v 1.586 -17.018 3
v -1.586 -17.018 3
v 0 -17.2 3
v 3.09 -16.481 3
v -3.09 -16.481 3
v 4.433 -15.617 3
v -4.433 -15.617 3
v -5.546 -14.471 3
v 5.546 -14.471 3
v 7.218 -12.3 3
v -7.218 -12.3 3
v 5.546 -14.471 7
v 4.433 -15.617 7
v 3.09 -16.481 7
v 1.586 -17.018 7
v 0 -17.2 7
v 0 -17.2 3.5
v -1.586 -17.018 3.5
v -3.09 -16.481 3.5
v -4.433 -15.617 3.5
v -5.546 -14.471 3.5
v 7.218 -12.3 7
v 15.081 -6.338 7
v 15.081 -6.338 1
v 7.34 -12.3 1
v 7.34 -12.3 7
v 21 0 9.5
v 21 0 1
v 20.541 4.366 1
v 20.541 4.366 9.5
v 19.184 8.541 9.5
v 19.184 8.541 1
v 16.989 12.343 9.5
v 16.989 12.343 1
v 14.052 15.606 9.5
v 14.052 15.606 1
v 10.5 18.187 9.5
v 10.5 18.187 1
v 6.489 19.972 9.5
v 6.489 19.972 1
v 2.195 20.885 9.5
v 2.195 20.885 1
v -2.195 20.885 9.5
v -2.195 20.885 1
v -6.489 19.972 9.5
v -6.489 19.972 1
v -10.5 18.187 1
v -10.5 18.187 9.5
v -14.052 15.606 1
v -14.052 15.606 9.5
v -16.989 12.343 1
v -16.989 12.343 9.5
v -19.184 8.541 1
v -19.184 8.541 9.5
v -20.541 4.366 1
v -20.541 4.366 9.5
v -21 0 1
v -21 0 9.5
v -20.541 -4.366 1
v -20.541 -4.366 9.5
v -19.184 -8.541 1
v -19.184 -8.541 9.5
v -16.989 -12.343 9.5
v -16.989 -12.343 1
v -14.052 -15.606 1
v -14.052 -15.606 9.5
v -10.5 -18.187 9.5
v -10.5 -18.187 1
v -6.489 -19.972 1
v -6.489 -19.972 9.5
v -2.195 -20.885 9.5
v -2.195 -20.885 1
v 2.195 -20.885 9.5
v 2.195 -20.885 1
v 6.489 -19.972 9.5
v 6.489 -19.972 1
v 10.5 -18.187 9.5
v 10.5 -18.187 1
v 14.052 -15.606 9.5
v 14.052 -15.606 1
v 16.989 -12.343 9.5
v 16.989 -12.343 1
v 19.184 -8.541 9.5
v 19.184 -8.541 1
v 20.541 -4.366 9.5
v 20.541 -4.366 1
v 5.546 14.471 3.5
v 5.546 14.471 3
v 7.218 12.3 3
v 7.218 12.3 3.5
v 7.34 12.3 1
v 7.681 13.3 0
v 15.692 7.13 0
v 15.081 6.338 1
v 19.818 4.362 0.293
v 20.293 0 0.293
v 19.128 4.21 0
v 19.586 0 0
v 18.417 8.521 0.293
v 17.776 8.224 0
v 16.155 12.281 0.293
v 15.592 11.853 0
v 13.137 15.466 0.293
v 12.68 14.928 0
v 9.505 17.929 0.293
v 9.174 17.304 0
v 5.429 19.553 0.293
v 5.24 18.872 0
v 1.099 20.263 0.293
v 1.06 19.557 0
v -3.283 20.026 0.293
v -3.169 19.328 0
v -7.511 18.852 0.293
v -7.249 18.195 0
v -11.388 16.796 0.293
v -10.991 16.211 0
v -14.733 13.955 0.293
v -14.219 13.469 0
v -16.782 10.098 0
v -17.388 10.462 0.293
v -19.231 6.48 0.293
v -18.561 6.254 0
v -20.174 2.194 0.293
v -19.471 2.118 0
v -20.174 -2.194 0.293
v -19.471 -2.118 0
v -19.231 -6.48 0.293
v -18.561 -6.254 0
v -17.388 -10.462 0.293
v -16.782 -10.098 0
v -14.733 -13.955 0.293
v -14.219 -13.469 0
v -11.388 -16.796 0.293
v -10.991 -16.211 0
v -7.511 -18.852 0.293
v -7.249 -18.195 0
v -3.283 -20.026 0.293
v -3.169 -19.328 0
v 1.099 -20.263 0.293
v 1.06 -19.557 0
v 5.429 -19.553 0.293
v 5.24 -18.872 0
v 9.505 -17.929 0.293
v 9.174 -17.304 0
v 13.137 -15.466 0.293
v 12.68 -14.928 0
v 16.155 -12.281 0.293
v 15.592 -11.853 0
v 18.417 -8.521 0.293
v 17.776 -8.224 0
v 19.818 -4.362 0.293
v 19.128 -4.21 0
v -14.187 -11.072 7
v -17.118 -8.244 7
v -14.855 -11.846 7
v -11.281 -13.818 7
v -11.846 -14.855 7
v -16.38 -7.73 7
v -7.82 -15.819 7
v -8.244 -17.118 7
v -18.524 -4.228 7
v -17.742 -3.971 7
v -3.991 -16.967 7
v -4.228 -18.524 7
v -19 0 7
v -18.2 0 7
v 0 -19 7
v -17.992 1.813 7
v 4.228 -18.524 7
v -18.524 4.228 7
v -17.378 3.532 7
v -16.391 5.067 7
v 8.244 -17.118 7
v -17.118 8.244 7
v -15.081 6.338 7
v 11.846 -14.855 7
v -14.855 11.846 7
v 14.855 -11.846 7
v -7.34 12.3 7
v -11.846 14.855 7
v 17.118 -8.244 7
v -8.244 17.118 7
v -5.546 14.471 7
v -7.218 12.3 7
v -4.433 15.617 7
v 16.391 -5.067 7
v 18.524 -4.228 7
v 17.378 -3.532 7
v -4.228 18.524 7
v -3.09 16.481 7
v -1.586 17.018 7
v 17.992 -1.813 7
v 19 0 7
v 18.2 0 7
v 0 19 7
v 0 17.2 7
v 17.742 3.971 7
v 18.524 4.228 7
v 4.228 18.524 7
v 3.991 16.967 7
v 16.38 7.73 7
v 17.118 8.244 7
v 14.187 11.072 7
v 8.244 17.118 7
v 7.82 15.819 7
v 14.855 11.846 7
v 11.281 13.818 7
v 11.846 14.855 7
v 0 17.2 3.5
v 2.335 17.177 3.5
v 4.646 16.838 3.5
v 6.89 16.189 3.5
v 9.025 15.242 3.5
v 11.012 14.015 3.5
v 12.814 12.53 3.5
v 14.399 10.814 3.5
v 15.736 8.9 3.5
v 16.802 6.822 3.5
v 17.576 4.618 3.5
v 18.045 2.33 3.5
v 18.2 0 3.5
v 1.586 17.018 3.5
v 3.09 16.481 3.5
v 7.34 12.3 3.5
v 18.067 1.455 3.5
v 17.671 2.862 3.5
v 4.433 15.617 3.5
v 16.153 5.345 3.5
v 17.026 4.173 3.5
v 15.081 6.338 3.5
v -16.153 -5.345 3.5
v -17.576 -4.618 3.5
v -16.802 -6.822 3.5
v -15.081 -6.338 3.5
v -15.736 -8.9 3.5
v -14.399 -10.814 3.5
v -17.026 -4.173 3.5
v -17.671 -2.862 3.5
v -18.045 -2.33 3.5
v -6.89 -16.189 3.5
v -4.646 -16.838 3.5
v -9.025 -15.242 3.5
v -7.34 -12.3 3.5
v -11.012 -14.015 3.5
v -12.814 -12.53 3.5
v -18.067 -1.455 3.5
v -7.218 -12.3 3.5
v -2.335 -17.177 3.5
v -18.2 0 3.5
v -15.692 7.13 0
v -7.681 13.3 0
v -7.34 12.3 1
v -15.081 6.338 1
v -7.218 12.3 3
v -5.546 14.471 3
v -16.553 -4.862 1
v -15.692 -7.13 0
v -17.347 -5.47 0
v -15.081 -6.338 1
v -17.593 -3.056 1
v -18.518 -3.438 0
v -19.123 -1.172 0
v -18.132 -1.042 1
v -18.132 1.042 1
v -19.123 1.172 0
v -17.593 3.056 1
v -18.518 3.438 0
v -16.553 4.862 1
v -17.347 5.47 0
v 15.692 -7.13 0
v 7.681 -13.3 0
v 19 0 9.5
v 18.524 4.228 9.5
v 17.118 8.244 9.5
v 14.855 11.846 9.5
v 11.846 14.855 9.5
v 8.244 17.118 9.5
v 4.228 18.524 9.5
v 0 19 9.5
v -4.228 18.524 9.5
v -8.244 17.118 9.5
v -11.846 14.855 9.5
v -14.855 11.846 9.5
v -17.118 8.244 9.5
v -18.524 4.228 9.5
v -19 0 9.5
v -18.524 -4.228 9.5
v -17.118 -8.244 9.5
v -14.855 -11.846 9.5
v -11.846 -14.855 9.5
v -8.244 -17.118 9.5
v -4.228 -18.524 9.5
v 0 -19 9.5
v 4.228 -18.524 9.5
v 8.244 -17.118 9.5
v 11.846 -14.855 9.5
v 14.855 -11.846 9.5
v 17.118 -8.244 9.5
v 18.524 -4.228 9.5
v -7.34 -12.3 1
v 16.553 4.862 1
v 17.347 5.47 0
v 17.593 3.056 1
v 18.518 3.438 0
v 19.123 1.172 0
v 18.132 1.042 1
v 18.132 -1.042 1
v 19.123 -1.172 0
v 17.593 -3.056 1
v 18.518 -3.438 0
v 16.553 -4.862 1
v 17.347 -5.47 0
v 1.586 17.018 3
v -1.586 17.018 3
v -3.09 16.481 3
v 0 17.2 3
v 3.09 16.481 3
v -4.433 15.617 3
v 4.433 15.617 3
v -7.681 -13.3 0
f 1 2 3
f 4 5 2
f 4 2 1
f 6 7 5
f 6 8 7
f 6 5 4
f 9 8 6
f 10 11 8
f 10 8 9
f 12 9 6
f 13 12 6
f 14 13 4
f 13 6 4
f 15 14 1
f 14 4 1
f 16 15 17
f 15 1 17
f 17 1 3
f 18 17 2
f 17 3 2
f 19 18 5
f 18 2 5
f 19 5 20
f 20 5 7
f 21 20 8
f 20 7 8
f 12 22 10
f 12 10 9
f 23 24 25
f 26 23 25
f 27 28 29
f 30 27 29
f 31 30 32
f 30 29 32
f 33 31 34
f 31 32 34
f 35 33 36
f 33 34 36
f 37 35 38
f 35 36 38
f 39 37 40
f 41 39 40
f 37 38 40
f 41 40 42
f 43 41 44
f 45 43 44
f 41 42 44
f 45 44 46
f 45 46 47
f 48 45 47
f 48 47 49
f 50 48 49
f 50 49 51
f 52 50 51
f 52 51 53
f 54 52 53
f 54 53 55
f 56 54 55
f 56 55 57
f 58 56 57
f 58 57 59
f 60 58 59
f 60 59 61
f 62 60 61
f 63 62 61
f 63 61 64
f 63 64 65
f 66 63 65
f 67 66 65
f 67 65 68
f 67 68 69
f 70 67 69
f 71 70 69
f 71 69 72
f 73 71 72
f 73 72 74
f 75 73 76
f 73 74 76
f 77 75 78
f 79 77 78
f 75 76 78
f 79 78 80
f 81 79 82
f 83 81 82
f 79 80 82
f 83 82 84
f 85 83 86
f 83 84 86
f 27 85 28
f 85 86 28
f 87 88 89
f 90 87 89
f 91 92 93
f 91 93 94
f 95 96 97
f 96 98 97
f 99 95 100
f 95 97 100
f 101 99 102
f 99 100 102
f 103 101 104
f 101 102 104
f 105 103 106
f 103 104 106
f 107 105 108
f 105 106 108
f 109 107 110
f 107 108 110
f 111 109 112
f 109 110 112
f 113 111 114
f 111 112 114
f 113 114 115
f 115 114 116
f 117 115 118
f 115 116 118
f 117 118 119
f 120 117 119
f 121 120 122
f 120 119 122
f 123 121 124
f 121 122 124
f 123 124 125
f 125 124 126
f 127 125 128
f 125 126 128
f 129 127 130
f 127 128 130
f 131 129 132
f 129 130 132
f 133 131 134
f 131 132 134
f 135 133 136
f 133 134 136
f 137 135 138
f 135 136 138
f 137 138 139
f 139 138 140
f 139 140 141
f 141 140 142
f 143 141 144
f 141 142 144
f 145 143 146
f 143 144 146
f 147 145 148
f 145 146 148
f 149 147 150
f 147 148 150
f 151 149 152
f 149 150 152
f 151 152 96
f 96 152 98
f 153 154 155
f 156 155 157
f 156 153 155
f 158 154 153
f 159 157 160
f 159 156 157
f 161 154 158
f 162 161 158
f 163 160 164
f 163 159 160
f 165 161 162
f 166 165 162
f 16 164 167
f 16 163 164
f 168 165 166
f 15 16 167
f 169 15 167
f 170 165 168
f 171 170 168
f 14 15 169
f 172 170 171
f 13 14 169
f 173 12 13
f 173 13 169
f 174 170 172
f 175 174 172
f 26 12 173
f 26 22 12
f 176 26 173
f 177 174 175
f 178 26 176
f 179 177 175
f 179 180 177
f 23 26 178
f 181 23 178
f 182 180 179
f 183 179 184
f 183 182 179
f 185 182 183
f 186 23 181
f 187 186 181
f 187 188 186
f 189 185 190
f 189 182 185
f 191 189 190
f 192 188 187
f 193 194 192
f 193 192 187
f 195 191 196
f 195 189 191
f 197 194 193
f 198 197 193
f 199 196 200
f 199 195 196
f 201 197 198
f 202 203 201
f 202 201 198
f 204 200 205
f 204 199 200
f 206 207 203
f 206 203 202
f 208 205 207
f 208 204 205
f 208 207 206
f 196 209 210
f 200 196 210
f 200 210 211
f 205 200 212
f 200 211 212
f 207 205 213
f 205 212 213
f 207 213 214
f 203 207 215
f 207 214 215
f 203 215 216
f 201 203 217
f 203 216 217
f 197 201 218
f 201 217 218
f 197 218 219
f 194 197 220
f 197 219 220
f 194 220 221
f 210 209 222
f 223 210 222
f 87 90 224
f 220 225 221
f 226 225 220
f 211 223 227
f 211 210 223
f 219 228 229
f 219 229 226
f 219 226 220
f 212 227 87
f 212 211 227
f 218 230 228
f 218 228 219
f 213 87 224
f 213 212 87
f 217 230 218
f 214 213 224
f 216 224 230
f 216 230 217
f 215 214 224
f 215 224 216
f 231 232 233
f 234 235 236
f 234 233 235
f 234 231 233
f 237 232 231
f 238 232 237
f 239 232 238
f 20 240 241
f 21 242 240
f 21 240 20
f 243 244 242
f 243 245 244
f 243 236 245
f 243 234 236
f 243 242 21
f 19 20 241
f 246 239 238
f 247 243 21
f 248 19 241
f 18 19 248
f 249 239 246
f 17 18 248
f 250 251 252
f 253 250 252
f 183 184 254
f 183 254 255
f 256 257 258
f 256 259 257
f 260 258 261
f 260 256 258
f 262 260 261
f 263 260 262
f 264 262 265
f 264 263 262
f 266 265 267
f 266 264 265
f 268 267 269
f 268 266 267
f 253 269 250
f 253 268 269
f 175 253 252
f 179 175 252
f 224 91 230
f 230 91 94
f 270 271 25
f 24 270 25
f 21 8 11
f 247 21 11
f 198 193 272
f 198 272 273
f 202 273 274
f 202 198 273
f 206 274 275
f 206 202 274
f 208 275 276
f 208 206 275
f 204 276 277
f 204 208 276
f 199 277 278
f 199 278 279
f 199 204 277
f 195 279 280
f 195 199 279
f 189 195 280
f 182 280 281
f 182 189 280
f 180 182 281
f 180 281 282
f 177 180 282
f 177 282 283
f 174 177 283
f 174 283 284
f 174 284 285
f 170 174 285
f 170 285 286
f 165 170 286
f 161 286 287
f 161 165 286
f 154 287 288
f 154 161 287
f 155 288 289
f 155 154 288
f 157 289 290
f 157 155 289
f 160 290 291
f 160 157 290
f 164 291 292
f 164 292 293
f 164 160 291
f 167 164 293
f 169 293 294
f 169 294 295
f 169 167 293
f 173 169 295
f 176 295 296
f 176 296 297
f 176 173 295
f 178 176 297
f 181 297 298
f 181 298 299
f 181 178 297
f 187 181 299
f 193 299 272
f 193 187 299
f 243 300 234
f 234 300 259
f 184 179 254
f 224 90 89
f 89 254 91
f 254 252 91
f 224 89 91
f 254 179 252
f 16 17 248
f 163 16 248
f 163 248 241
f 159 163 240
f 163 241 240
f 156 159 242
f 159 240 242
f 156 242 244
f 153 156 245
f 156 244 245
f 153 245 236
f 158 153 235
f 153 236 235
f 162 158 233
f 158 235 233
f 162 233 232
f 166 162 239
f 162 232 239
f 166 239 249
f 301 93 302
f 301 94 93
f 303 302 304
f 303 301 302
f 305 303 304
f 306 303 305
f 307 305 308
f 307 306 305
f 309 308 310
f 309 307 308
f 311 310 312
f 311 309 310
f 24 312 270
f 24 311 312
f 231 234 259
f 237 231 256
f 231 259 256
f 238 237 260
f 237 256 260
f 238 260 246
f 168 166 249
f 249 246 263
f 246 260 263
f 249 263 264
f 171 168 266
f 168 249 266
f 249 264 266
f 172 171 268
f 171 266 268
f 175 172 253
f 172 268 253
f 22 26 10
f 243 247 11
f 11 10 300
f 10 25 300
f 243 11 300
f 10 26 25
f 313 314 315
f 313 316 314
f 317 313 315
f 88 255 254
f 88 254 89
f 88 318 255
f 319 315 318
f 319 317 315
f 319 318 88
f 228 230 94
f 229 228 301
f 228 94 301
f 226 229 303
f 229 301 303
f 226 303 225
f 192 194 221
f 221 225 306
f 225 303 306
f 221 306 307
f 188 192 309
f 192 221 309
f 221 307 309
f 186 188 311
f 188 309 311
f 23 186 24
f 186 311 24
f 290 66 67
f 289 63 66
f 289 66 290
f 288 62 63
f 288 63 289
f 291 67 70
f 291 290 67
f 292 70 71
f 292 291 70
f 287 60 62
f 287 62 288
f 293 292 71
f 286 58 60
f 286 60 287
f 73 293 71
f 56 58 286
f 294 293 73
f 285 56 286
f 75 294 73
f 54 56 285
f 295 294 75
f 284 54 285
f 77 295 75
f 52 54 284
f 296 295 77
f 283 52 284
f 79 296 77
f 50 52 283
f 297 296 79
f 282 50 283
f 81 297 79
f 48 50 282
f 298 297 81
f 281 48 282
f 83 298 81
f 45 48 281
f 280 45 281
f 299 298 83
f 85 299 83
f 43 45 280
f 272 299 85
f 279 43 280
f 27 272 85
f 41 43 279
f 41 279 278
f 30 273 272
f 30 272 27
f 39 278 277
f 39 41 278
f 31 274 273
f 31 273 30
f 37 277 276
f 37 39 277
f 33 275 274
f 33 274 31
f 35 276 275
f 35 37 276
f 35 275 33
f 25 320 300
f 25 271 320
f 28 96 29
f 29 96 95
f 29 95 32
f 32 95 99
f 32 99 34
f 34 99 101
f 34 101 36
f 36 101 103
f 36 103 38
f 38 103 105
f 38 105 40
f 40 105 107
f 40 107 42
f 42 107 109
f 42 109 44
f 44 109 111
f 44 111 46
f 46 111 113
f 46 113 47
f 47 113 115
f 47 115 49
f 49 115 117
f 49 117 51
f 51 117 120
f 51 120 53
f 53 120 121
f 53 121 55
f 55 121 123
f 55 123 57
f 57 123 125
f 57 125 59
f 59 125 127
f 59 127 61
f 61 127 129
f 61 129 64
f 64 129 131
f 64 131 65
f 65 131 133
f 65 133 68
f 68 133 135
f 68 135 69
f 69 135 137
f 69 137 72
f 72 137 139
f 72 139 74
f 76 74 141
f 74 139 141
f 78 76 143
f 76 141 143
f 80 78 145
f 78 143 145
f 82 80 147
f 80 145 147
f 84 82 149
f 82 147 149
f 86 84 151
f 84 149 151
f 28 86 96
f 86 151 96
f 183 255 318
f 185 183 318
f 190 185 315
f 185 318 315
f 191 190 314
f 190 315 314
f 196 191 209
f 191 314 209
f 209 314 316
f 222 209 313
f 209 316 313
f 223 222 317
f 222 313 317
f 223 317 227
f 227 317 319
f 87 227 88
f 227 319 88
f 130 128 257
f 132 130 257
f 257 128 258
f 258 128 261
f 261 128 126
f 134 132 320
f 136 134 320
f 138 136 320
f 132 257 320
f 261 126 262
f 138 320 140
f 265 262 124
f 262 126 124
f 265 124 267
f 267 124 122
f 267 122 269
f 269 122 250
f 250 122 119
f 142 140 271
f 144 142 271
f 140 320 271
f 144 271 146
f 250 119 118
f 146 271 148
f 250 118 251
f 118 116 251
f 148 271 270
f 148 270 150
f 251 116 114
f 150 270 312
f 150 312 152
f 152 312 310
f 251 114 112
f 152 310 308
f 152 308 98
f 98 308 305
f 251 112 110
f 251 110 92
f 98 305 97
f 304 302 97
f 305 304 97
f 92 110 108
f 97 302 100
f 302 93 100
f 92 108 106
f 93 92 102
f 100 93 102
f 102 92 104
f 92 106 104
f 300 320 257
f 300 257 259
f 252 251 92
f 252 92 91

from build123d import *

# Parameters (mm, degrees)
F0_R         = 21
F1_DEPTH     = 3
F2_R         = 21
F3_DEPTH     = 0.5
F4_R         = 21
F5_DEPTH     = 3.5
F6_R         = 21
F6_R_2       = 19
F7_DEPTH     = 2.5
F8_SIZE      = 1
F9_T6_DEPTH  = 12.3424053326
F9_T11_DEPTH = 19.8242698458
F9_T17_DEPTH = 12.3424053326
F9_T20_ANGLE = 104.7950367117
F9_T24_DEPTH = 12.3424053326
F9_T29_DEPTH = 19.8242698458
F9_T35_DEPTH = 12.3424053326
F9_T38_ANGLE = 104.7950367117
F9_T43_DEPTH = 12.3424053326
F9_T47_DEPTH = 19.8242698458
F9_T54_DEPTH = 19.8242698458
F9_T58_DEPTH = 12.3424053326
F9_T65_DEPTH = 12.3424053326
F9_T69_DEPTH = 19.8242698458
F9_T76_DEPTH = 19.8242698458
F9_T80_DEPTH = 12.3424053326


# Not quite as in the source:
# - a fillet or chamfer that OpenCascade refuses, or shapes differently, is made with other operations: its cross-section is extruded or revolved along the edge and cut away or added


with BuildPart() as f1:
    # F0 (on Top) → F1 (new body)
    with BuildSketch(Plane.XY):
        Circle(F0_R)
        with BuildLine():
            Line((-15.0814358373, 6.3381057238), (-7.340451935, 12.3))
            Line((-7.340451935, 12.3), (7.340451935, 12.3))
            Line((7.340451935, 12.3), (15.0814358373, 6.3381057238))
            ThreePointArc((15.0814358373, 6.3381057238), (18.2, 0), (15.0814358373, -6.3381057238))
            Line((15.0814358373, -6.3381057238), (7.340451935, -12.3))
            Line((7.340451935, -12.3), (-7.340451935, -12.3))
            Line((-7.340451935, -12.3), (-15.0814358373, -6.3381057238))
            ThreePointArc((-15.0814358373, -6.3381057238), (-18.2, 0), (-15.0814358373, 6.3381057238))
        make_face(mode=Mode.SUBTRACT)
    extrude(amount=F1_DEPTH)

    # F2 (on face) → F3 (join)
    with BuildSketch(Plane.XY.offset(3)):
        Circle(F2_R)
        with BuildLine():
            Line((-15.0814358373, 6.3381057238), (-7.340451935, 12.3))
            Line((-7.340451935, 12.3), (-7.2180848246, 12.3))
            Line((-7.2180848246, 12.3), (-5.5458425084, 14.4712563576))
            ThreePointArc((-5.5458425084, 14.4712563576), (-3.0904049489, 16.4808755163), (0, 17.2))
            ThreePointArc((0, 17.2), (3.0904049489, 16.4808755163), (5.5458425084, 14.4712563576))
            Line((5.5458425084, 14.4712563576), (7.2180848246, 12.3))
            Line((7.2180848246, 12.3), (7.340451935, 12.3))
            Line((7.340451935, 12.3), (15.0814358373, 6.3381057238))
            ThreePointArc((15.0814358373, 6.3381057238), (17.3781434472, 3.5318913702), (18.2, 0))
            ThreePointArc((18.2, 0), (17.3781434472, -3.5318913702), (15.0814358373, -6.3381057238))
            Line((15.0814358373, -6.3381057238), (7.340451935, -12.3))
            Line((7.340451935, -12.3), (7.2180848246, -12.3))
            Line((7.2180848246, -12.3), (5.5458425084, -14.4712563576))
            ThreePointArc((5.5458425084, -14.4712563576), (3.0904049489, -16.4808755163), (0, -17.2))
            ThreePointArc((0, -17.2), (-3.0904049489, -16.4808755163), (-5.5458425084, -14.4712563576))
            Line((-5.5458425084, -14.4712563576), (-7.2180848246, -12.3))
            Line((-7.2180848246, -12.3), (-7.340451935, -12.3))
            Line((-7.340451935, -12.3), (-15.0814358373, -6.3381057238))
            ThreePointArc((-15.0814358373, -6.3381057238), (-17.3781434472, -3.5318913702), (-18.2, 0))
            ThreePointArc((-18.2, 0), (-17.3781434472, 3.5318913702), (-15.0814358373, 6.3381057238))
        make_face(mode=Mode.SUBTRACT)
    extrude(amount=F3_DEPTH)

    # F4 (on face) → F5 (join)
    with BuildSketch(Plane.XY.offset(3.5)):
        Circle(F4_R)
        with BuildLine():
            Line((-15.0814358373, 6.3381057238), (-7.340451935, 12.3))
            Line((-7.340451935, 12.3), (-7.2180848246, 12.3))
            Line((-7.2180848246, 12.3), (-5.5458425084, 14.4712563576))
            ThreePointArc((-5.5458425084, 14.4712563576), (-3.0904049489, 16.4808755163), (0, 17.2))
            ThreePointArc((0, 17.2), (12.8139825122, 12.529911728), (18.2, 0))
            ThreePointArc((18.2, 0), (17.3781434472, -3.5318913702), (15.0814358373, -6.3381057238))
            Line((15.0814358373, -6.3381057238), (7.340451935, -12.3))
            Line((7.340451935, -12.3), (7.2180848246, -12.3))
            Line((7.2180848246, -12.3), (5.5458425084, -14.4712563576))
            ThreePointArc((5.5458425084, -14.4712563576), (3.0904049489, -16.4808755163), (0, -17.2))
            ThreePointArc((0, -17.2), (-12.8139825122, -12.529911728), (-18.2, 0))
            ThreePointArc((-18.2, 0), (-17.3781434472, 3.5318913702), (-15.0814358373, 6.3381057238))
        make_face(mode=Mode.SUBTRACT)
    extrude(amount=F5_DEPTH)

    # F6 (on face) → F7 (join)
    with BuildSketch(Plane.XY.offset(7)):
        Circle(F6_R)
        Circle(F6_R_2, mode=Mode.SUBTRACT)
    extrude(amount=F7_DEPTH)

    # F8
    f8_edges = [f1.edges().sort_by_distance(p)[0] for p in [
        (-21, 0, 0),
    ]]
    chamfer(f8_edges, length=F8_SIZE)

    # F9: chamfer of 1 on 9 edges, made by hand

    # F9_s1 → F9_t2 (revolve, cut)
    with BuildSketch(Plane.XZ):
        Polygon((20.2928932188, 0.2928932188), (19.5857864376, 0), (20, 0), align=None)
    revolve(axis=Axis((0, 0, 0), (0, 0, 1)), mode=Mode.SUBTRACT)


with BuildPart() as f9_tool4:
    # F9_s5 → F9_t6 (new body)
    with BuildSketch(Plane(origin=(-6.4023462265, -4.9309121171, 0), x_dir=(0, 0, 1), z_dir=(0.7922632155, 0.6101794797, 0))):
        Polygon((0, -15.2238306925), (1, -14.2238306925), (0, -14.2238306925), align=None)
    extrude(amount=F9_T6_DEPTH)

    split(bisect_by=Plane.XZ.offset(-12.3), keep=Keep.TOP)


with BuildPart() as f1_1:
    add(f1.part)

    # F9_t3: cut F9_tool4
    add(f9_tool4.part, mode=Mode.SUBTRACT)


with BuildPart() as f9_tool9:
    # F9_s10 → F9_t11 (new body)
    with BuildSketch(Plane.YZ.offset(-9.9121349229)):
        Polygon((13.3, 0), (12.3, 1), (12.3, 0), align=None)
    extrude(amount=F9_T11_DEPTH)

    split(bisect_by=Plane(origin=(-8.6790896108, 11.2690178409, 0), x_dir=(0, 0, 1), z_dir=(0.6101794797, -0.7922632155, 0)), keep=Keep.TOP)

    split(bisect_by=Plane(origin=(8.6790896108, 11.2690178409, 0), x_dir=(0, 0, 1), z_dir=(-0.6101794797, -0.7922632155, 0)), keep=Keep.TOP)


with BuildPart() as f1_2:
    add(f1_1.part)

    # F9_t8: cut F9_tool9
    add(f9_tool9.part, mode=Mode.SUBTRACT)


with BuildPart() as f9_tool15:
    # F9_s16 → F9_t17 (new body)
    with BuildSketch(Plane(origin=(-3.376087509, 2.6001703465, 0), x_dir=(0, 0, 1), z_dir=(0.7922632155, -0.6101794797, 0))):
        Polygon((0, -15.2238306925), (1, -14.2238306925), (0, -14.2238306925), align=None)
    extrude(amount=F9_T17_DEPTH)

    split(bisect_by=Plane.XZ.offset(-12.3), keep=Keep.TOP)


with BuildPart() as f1_3:
    add(f1_2.part)

    # F9_t14: cut F9_tool15
    add(f9_tool15.part, mode=Mode.SUBTRACT)

    # F9_s19 → F9_t20 (revolve, cut)
    with BuildSketch(Plane(origin=(6.4023462265, -4.9309121171, 0), x_dir=(0, 0, 1), z_dir=(-0.7922632155, 0.6101794797, 0))):
        Polygon((0, 15.2238306925), (1, 14.2238306925), (0, 14.2238306925), align=None)
    revolve(axis=Axis((10.2, 0, 0), (0, 0, -1)), revolution_arc=F9_T20_ANGLE, mode=Mode.SUBTRACT)


with BuildPart() as f9_tool22:
    # F9_s23 → F9_t24 (new body)
    with BuildSketch(Plane(origin=(6.4023462265, 4.9309121171, 0), x_dir=(0, 0, 1), z_dir=(-0.7922632155, -0.6101794797, 0))):
        Polygon((0, -15.2238306925), (1, -14.2238306925), (0, -14.2238306925), align=None)
    extrude(amount=F9_T24_DEPTH)

    split(bisect_by=Plane.XZ.offset(12.3), keep=Keep.BOTTOM)


with BuildPart() as f1_4:
    add(f1_3.part)

    # F9_t21: cut F9_tool22
    add(f9_tool22.part, mode=Mode.SUBTRACT)


with BuildPart() as f9_tool27:
    # F9_s28 → F9_t29 (new body)
    with BuildSketch(Plane.YZ.offset(9.9121349229)):
        Polygon((-13.3, 0), (-12.3, 1), (-12.3, 0), align=None)
    extrude(amount=-F9_T29_DEPTH)

    split(bisect_by=Plane(origin=(8.6790896108, -11.2690178409, 0), x_dir=(0, 0, 1), z_dir=(-0.6101794797, 0.7922632155, 0)), keep=Keep.TOP)

    split(bisect_by=Plane(origin=(-8.6790896108, -11.2690178409, 0), x_dir=(0, 0, 1), z_dir=(0.6101794797, 0.7922632155, 0)), keep=Keep.TOP)


with BuildPart() as f1_5:
    add(f1_4.part)

    # F9_t26: cut F9_tool27
    add(f9_tool27.part, mode=Mode.SUBTRACT)


with BuildPart() as f9_tool33:
    # F9_s34 → F9_t35 (new body)
    with BuildSketch(Plane(origin=(3.376087509, -2.6001703465, 0), x_dir=(0, 0, 1), z_dir=(-0.7922632155, 0.6101794797, 0))):
        Polygon((0, -15.2238306925), (1, -14.2238306925), (0, -14.2238306925), align=None)
    extrude(amount=F9_T35_DEPTH)

    split(bisect_by=Plane.XZ.offset(12.3), keep=Keep.BOTTOM)


with BuildPart() as f1_6:
    add(f1_5.part)

    # F9_t32: cut F9_tool33
    add(f9_tool33.part, mode=Mode.SUBTRACT)

    # F9_s37 → F9_t38 (revolve, cut)
    with BuildSketch(Plane(origin=(-6.4023462265, 4.9309121171, 0), x_dir=(0, 0, 1), z_dir=(0.7922632155, -0.6101794797, 0))):
        Polygon((0, 15.2238306925), (1, 14.2238306925), (0, 14.2238306925), align=None)
    revolve(axis=Axis((-10.2, 0, 0), (0, 0, -1)), revolution_arc=F9_T38_ANGLE, mode=Mode.SUBTRACT)


with BuildPart() as f9_tool41:
    # F9_s42 → F9_t43 (new body)
    with BuildSketch(Plane(origin=(-6.4023462265, -4.9309121171, 0), x_dir=(0, 0, 1), z_dir=(0.7922632155, 0.6101794797, 0))):
        Polygon((0, -15.2238306925), (1, -14.2238306925), (0, -14.2238306925), align=None)
    extrude(amount=F9_T43_DEPTH)

    split(bisect_by=Plane.XZ.offset(-12.3), keep=Keep.BOTTOM)


with BuildPart() as f9_tool45:
    # F9_s46 → F9_t47 (new body)
    with BuildSketch(Plane.YZ.offset(-9.9121349229)):
        Polygon((13.3, 0), (12.3, 1), (12.3, 0), align=None)
    extrude(amount=F9_T47_DEPTH)

    split(bisect_by=Plane(origin=(-8.6790896108, 11.2690178409, 0), x_dir=(0, 0, 1), z_dir=(-0.6101794797, 0.7922632155, 0)), keep=Keep.TOP)


with BuildPart() as f9_tool41_1:
    add(f9_tool41.part)

    # F9_t49: intersect F9_tool45
    add(f9_tool45.part, mode=Mode.INTERSECT)


with BuildPart() as f1_7:
    add(f1_6.part)

    # F9_t39: cut F9_tool41
    add(f9_tool41_1.part, mode=Mode.SUBTRACT)


with BuildPart() as f9_tool52:
    # F9_s53 → F9_t54 (new body)
    with BuildSketch(Plane.YZ.offset(-9.9121349229)):
        Polygon((13.3, 0), (12.3, 1), (12.3, 0), align=None)
    extrude(amount=F9_T54_DEPTH)

    split(bisect_by=Plane(origin=(8.6790896108, 11.2690178409, 0), x_dir=(0, 0, 1), z_dir=(0.6101794797, 0.7922632155, 0)), keep=Keep.TOP)


with BuildPart() as f9_tool56:
    # F9_s57 → F9_t58 (new body)
    with BuildSketch(Plane(origin=(-3.376087509, 2.6001703465, 0), x_dir=(0, 0, 1), z_dir=(0.7922632155, -0.6101794797, 0))):
        Polygon((0, -15.2238306925), (1, -14.2238306925), (0, -14.2238306925), align=None)
    extrude(amount=F9_T58_DEPTH)

    split(bisect_by=Plane.XZ.offset(-12.3), keep=Keep.BOTTOM)


with BuildPart() as f9_tool52_1:
    add(f9_tool52.part)

    # F9_t60: intersect F9_tool56
    add(f9_tool56.part, mode=Mode.INTERSECT)


with BuildPart() as f1_8:
    add(f1_7.part)

    # F9_t50: cut F9_tool52
    add(f9_tool52_1.part, mode=Mode.SUBTRACT)


with BuildPart() as f9_tool63:
    # F9_s64 → F9_t65 (new body)
    with BuildSketch(Plane(origin=(6.4023462265, 4.9309121171, 0), x_dir=(0, 0, 1), z_dir=(-0.7922632155, -0.6101794797, 0))):
        Polygon((0, -15.2238306925), (1, -14.2238306925), (0, -14.2238306925), align=None)
    extrude(amount=F9_T65_DEPTH)

    split(bisect_by=Plane.XZ.offset(12.3), keep=Keep.TOP)


with BuildPart() as f9_tool67:
    # F9_s68 → F9_t69 (new body)
    with BuildSketch(Plane.YZ.offset(9.9121349229)):
        Polygon((-13.3, 0), (-12.3, 1), (-12.3, 0), align=None)
    extrude(amount=-F9_T69_DEPTH)

    split(bisect_by=Plane(origin=(8.6790896108, -11.2690178409, 0), x_dir=(0, 0, 1), z_dir=(0.6101794797, -0.7922632155, 0)), keep=Keep.TOP)


with BuildPart() as f9_tool63_1:
    add(f9_tool63.part)

    # F9_t71: intersect F9_tool67
    add(f9_tool67.part, mode=Mode.INTERSECT)


with BuildPart() as f1_9:
    add(f1_8.part)

    # F9_t61: cut F9_tool63
    add(f9_tool63_1.part, mode=Mode.SUBTRACT)


with BuildPart() as f9_tool74:
    # F9_s75 → F9_t76 (new body)
    with BuildSketch(Plane.YZ.offset(9.9121349229)):
        Polygon((-13.3, 0), (-12.3, 1), (-12.3, 0), align=None)
    extrude(amount=-F9_T76_DEPTH)

    split(bisect_by=Plane(origin=(-8.6790896108, -11.2690178409, 0), x_dir=(0, 0, 1), z_dir=(-0.6101794797, -0.7922632155, 0)), keep=Keep.TOP)


with BuildPart() as f9_tool78:
    # F9_s79 → F9_t80 (new body)
    with BuildSketch(Plane(origin=(3.376087509, -2.6001703465, 0), x_dir=(0, 0, 1), z_dir=(-0.7922632155, 0.6101794797, 0))):
        Polygon((0, -15.2238306925), (1, -14.2238306925), (0, -14.2238306925), align=None)
    extrude(amount=F9_T80_DEPTH)

    split(bisect_by=Plane.XZ.offset(12.3), keep=Keep.TOP)


with BuildPart() as f9_tool74_1:
    add(f9_tool74.part)

    # F9_t82: intersect F9_tool78
    add(f9_tool78.part, mode=Mode.INTERSECT)


with BuildPart() as f1_10:
    add(f1_9.part)

    # F9_t72: cut F9_tool74
    add(f9_tool74_1.part, mode=Mode.SUBTRACT)


solid = f1_10.part
